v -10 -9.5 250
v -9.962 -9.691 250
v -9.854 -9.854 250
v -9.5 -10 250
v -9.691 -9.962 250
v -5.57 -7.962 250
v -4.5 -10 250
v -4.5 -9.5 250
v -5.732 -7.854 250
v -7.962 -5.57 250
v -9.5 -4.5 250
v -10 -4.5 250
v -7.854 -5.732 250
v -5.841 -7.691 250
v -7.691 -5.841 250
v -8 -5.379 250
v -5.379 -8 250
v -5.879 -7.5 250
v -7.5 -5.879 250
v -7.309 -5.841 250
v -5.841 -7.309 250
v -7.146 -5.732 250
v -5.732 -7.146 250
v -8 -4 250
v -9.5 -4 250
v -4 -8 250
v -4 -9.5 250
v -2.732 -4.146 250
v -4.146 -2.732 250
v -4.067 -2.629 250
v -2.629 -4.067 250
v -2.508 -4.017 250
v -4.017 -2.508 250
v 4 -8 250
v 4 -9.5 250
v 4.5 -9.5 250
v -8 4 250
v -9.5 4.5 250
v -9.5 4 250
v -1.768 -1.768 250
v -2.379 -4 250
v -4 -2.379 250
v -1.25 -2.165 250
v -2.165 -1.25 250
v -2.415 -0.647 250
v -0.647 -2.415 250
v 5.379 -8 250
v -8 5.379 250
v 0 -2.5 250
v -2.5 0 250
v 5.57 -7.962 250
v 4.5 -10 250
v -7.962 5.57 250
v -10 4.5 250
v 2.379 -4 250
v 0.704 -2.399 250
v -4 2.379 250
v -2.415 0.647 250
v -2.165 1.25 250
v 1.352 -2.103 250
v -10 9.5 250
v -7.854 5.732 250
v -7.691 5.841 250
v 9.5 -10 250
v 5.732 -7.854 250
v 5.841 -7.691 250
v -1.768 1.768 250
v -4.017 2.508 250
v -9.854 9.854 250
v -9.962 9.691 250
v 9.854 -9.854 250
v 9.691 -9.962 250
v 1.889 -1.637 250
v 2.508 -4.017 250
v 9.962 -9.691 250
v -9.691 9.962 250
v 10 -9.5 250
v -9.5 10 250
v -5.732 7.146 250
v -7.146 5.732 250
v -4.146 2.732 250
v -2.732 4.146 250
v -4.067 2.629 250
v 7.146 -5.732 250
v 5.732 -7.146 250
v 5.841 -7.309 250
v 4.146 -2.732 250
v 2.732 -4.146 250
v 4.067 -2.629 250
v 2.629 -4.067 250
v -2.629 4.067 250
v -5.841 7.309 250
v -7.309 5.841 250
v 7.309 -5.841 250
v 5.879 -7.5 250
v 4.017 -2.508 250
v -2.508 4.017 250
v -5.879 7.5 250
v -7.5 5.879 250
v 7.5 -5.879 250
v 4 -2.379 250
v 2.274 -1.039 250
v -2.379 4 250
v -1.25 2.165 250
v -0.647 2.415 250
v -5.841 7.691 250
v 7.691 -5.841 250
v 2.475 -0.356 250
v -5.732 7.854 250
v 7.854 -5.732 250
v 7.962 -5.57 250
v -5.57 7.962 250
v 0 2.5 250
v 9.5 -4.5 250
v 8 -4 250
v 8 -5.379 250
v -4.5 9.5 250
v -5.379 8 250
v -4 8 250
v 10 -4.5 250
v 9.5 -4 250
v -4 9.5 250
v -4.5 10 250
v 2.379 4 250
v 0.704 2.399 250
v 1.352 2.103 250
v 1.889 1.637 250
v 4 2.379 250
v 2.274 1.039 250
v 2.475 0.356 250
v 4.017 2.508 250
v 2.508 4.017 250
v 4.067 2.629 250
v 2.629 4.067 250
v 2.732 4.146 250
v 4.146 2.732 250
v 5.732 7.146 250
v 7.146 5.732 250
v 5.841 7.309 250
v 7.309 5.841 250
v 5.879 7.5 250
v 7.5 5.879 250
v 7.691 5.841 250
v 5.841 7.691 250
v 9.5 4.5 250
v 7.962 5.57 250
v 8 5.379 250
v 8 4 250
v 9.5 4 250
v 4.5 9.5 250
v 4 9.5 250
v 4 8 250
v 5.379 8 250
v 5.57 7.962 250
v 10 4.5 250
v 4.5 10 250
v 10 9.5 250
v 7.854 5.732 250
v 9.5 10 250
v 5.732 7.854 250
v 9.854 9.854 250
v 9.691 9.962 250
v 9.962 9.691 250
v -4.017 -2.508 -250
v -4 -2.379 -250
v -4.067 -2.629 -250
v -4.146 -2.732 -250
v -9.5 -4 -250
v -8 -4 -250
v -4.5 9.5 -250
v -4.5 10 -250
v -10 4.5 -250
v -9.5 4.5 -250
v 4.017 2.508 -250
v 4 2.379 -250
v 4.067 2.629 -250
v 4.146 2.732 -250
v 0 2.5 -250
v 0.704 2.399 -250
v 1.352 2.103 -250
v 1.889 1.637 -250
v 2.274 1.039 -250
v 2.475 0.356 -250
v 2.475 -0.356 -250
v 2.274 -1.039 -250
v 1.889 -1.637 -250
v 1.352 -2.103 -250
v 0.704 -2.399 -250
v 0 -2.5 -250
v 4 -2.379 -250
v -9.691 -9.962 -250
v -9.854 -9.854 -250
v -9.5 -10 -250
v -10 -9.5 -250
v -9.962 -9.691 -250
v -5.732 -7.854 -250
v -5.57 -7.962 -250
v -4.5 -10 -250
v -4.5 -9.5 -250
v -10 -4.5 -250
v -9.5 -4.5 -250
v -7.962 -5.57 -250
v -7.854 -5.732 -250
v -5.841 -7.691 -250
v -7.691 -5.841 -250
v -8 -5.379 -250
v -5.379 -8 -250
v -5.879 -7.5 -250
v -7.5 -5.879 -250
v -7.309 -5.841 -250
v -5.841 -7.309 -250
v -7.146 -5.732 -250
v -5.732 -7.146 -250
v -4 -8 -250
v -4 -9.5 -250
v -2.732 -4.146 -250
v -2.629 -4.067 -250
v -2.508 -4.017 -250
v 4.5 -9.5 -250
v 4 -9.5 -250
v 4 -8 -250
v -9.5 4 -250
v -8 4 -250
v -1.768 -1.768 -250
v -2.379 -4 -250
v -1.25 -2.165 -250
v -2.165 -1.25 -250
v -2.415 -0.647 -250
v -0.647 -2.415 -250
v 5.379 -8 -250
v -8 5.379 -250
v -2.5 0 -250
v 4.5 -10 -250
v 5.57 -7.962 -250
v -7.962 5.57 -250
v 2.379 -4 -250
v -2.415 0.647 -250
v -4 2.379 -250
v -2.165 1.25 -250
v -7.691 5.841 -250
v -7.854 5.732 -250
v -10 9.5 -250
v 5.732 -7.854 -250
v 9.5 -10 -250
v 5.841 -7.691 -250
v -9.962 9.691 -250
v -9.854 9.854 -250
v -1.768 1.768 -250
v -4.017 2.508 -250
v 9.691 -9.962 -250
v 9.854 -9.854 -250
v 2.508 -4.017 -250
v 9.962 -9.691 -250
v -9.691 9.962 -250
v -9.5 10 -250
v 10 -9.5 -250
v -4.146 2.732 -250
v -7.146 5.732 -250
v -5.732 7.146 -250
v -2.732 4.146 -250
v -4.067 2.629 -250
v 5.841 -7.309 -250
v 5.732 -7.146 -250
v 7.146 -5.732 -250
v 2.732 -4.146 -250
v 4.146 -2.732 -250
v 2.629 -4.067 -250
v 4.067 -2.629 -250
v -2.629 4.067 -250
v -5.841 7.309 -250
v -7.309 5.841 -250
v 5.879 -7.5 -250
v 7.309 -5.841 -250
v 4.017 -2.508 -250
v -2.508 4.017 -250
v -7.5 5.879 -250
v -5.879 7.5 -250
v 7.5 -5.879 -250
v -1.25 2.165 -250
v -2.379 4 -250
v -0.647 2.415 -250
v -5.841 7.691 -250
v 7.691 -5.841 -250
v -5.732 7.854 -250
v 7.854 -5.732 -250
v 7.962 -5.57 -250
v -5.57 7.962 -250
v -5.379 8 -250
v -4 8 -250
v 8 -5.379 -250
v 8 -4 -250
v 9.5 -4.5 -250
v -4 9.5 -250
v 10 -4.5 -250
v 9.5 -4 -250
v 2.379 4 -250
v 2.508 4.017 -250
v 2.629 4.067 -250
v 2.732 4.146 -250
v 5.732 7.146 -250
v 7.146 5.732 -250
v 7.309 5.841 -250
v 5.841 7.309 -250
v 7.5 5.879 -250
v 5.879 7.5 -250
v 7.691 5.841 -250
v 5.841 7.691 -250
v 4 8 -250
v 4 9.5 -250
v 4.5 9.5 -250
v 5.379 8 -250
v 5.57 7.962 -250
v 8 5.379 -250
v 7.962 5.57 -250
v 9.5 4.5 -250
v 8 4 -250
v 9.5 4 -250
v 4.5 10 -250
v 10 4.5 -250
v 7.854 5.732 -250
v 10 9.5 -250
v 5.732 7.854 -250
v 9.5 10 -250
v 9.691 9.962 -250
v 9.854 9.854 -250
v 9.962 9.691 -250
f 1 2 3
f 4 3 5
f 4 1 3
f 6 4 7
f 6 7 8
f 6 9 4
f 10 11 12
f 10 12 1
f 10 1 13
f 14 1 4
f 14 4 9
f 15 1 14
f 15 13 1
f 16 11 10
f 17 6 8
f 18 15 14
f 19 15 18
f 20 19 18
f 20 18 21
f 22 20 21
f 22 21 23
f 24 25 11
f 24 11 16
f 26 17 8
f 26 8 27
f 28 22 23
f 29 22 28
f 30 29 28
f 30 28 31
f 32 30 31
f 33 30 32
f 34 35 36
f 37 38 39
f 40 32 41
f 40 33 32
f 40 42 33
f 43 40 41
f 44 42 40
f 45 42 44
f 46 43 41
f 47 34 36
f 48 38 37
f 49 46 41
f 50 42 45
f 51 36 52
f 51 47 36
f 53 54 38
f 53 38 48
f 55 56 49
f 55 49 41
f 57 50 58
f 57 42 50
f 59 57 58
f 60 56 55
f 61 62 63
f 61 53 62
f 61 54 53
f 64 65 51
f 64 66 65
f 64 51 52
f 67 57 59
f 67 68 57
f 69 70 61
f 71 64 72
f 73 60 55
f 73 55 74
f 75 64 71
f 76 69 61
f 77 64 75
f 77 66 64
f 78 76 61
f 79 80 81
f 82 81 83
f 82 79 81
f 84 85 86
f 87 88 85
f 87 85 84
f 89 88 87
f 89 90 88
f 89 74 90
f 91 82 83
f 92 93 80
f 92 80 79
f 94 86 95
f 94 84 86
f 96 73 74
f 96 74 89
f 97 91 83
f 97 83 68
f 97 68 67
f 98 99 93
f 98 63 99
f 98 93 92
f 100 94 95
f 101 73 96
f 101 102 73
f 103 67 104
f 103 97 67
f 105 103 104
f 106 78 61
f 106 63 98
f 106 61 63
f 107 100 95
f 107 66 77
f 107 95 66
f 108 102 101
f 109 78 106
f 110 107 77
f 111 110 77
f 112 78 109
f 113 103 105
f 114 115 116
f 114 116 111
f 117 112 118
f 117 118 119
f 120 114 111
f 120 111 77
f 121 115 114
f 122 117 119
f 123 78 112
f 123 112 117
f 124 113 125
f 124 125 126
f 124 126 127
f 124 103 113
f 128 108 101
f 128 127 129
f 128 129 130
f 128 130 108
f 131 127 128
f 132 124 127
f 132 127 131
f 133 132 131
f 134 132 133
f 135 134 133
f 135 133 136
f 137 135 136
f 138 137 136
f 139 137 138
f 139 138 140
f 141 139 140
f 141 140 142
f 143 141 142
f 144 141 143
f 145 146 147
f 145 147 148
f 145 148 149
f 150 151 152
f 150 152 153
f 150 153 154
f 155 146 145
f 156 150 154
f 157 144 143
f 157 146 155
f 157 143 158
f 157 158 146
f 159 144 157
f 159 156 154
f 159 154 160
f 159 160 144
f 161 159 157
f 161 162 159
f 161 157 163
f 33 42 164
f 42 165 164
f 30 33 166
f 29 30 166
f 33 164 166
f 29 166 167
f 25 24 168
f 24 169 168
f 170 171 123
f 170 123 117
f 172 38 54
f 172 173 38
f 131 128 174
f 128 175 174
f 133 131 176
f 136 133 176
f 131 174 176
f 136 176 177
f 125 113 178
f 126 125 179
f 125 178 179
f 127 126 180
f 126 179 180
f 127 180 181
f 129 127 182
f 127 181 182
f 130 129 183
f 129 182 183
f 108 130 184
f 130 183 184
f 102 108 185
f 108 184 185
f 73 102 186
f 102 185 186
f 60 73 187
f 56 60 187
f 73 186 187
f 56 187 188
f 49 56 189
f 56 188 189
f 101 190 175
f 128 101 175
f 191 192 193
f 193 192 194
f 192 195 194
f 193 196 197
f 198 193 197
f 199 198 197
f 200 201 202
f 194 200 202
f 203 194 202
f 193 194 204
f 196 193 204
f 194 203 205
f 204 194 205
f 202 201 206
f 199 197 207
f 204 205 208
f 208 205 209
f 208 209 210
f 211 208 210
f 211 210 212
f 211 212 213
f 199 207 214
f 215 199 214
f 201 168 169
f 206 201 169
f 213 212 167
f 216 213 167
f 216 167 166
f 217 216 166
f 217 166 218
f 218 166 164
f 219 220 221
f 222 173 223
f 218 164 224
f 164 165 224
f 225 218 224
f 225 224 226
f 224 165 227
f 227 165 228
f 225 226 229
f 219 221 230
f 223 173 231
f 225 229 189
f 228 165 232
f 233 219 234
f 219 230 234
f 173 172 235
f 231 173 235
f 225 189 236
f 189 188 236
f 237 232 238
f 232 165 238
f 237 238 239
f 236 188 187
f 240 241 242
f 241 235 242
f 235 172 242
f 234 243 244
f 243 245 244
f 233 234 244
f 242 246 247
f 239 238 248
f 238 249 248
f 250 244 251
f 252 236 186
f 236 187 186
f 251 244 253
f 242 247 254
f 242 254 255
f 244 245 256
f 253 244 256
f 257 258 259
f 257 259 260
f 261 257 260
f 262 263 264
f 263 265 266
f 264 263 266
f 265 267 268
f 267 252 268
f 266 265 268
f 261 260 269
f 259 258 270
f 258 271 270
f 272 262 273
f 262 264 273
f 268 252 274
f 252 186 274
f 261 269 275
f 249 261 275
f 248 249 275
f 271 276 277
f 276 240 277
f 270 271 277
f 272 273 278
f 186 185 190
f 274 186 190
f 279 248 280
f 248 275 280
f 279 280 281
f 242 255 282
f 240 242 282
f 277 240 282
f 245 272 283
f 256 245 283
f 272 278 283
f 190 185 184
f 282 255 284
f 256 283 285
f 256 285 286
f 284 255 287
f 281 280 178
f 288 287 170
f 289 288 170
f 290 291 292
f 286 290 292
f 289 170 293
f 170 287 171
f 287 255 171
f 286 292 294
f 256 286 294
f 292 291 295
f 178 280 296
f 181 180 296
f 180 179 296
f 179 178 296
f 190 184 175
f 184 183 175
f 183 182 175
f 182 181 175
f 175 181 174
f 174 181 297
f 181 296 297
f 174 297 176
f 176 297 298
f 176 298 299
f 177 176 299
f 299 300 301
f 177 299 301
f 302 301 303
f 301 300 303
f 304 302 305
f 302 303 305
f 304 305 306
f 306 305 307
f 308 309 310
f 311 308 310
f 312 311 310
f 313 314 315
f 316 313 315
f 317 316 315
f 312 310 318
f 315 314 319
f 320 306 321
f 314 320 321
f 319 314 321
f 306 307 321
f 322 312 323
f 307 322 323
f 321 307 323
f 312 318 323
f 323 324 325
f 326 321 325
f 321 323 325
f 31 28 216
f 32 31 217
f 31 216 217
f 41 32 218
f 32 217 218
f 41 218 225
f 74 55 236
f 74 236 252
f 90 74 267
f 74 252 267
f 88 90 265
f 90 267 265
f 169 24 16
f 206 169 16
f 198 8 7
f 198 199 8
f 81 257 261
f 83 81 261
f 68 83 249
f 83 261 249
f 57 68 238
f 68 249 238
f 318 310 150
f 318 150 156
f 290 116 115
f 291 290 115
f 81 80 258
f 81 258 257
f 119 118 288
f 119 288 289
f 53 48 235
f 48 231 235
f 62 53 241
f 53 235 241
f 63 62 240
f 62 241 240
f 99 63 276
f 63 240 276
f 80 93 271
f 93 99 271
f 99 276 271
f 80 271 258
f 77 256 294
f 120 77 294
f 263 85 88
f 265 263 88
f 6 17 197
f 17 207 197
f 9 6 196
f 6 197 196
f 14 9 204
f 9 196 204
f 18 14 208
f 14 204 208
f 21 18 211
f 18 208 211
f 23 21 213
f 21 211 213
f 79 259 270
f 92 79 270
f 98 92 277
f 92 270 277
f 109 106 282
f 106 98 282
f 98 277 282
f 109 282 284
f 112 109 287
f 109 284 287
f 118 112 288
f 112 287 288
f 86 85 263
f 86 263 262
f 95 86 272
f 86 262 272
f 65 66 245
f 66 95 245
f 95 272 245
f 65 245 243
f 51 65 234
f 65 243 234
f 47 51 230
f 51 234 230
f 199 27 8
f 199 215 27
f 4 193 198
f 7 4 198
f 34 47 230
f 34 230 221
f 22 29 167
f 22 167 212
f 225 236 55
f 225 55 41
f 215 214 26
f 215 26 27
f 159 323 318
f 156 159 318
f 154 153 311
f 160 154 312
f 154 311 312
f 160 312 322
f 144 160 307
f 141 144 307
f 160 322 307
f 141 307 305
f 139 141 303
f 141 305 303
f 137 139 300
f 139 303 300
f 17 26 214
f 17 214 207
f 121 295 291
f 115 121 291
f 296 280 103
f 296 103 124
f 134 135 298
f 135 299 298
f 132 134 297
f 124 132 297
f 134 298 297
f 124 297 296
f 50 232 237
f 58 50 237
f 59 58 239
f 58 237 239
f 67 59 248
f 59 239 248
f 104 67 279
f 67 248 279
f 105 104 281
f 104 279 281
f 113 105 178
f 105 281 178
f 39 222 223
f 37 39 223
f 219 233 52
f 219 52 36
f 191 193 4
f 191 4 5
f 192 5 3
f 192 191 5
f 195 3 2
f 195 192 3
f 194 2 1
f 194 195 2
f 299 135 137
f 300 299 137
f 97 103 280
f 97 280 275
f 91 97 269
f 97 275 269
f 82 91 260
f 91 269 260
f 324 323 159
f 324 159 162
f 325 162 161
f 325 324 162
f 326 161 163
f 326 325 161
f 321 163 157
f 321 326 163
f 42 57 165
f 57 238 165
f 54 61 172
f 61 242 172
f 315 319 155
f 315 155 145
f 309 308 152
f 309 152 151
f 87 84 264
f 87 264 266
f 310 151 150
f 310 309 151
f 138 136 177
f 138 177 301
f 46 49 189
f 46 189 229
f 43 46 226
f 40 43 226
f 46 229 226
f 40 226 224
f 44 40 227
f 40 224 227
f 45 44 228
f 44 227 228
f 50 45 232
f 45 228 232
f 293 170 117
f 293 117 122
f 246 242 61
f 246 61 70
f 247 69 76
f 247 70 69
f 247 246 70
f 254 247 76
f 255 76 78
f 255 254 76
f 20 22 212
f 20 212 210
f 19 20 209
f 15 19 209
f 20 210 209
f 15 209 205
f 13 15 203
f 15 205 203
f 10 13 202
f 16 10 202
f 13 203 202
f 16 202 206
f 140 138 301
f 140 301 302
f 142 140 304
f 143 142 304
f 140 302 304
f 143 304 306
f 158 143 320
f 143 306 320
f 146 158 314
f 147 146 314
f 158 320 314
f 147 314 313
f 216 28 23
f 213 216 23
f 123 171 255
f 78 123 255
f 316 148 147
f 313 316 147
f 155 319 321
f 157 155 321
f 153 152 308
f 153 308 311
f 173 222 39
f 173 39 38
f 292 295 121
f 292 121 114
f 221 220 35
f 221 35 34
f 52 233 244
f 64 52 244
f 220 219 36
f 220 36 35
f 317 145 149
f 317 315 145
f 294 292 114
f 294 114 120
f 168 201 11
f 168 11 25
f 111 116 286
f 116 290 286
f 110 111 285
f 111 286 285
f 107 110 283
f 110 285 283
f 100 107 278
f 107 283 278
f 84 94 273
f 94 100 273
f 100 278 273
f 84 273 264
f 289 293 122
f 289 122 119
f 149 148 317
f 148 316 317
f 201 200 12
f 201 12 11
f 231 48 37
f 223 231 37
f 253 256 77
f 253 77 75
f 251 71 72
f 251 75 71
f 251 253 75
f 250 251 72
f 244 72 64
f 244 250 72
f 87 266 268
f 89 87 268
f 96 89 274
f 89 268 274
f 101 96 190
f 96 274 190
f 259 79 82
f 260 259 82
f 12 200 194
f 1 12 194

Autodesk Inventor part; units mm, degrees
sketch "Esboço1" plane through (0, 0, 0) normal (0, 0, 1) x (1, 0, 0)
  line L0 (-10, 10) -> (10, 10) construction
  circle A0 centre (0, 0) radius 2.5 construction
  line L1 (-4, 4) -> (4, 4) construction
  line L2 (0, 0) -> (-10, 10) construction
  line L3 (-6.5858, 8) -> (-4, 8) construction
  line L4 (-4, 8) -> (-4, 10) construction
  line L5 (-4, 10) -> (-10, 10) construction
  line L6 (-4, 4) -> (-4, -4) construction
  line L7 (-6.5858, 8) -> (-2.5858, 4) construction
  line L8 (-8, 6.5858) -> (-4, 2.5858) construction
  line L9 (-10, 10) -> (-10, 0) construction
  line L10 (-10, 10) -> (-10, 4) construction
  line L11 (-8, 6.5858) -> (-8, 4) construction
  line L12 (-8, 4) -> (-10, 4) construction
  line L13 (-10, 4) -> (-9.5, 4) construction
  line L14 (-9.5, 4) -> (-9.5, 4.5)
  line L15 (-9.5, 4.5) -> (-10, 4.5)
  line L16 (-10, 4.5) -> (-10, 4) construction
  line L17 (-10, 10) -> (-10, 4.5) construction
  line L18 (-9.5, 4) -> (-8, 4)
  line L19 (-4, 10) -> (-4.5, 10) construction
  line L20 (-4.5, 10) -> (-4.5, 9.5)
  line L21 (-4.5, 9.5) -> (-4, 9.5)
  line L22 (-4, 9.5) -> (-4, 10) construction
  line L23 (-4, 9.5) -> (-4, 8)
  line L24 (-4.5, 10) -> (-10, 10) construction
  arc A1 (-9.5, 10) -> (-10, 9.5) centre (-9.5, 9.5) ccw
  line L25 (-4.5, 10) -> (-9.5, 10)
  line L26 (-10, 9.5) -> (-10, 4.5)
  line L27 (-2.5858, 4) -> (0, 4) construction
  arc A2 (-5.3787, 8) -> (-5.7322, 7.1464) centre (-5.3787, 7.5) ccw
  line L28 (-5.3787, 8) -> (-4, 8)
  line L29 (-5.7322, 7.1464) -> (-2.5858, 4) construction
  arc A3 (-7.1464, 5.7322) -> (-8, 5.3787) centre (-7.5, 5.3787) ccw
  line L30 (-7.1464, 5.7322) -> (-4, 2.5858) construction
  line L31 (-8, 5.3787) -> (-8, 4)
  arc A4 (0, 2.5) -> (-2.5, 0) centre (0, 0) ccw
  line L32 (0, 4) -> (0, 2.5)
  line L33 (-4, 2.5858) -> (-4, 0) construction
  line L34 (-4, 0) -> (-2.5, 0)
  arc A5 (-2.7322, 4.1464) -> (-2.3787, 4) centre (-2.3787, 4.5) ccw
  line L35 (-5.7322, 7.1464) -> (-2.7322, 4.1464)
  line L36 (-2.3787, 4) -> (0, 4)
  arc A6 (-4, 2.3787) -> (-4.1464, 2.7322) centre (-4.5, 2.3787) ccw
  line L37 (-7.1464, 5.7322) -> (-4.1464, 2.7322)
  line L38 (-4, 2.3787) -> (-4, 0)
  point P0 (0, 10)
  point P1 (-3.25, 0)
  dimension "d0" = 20
  dimension "d2" = 5
  dimension "d3" = 6
  dimension "d5" = 2
  dimension "d7" = 1
  dimension "d8" = 6
  dimension "d9" = 1
  dimension "d10" = 0.5
  dimension "d11" = 0.5
  dimension "d12" = 0.5
  dimension "d14" = 0.5
  dimension "d15" = 0.5
  dimension "d16" = 10
  dimension "d17" = 2.5
  dimension "d20" = 0.5
  dimension "d21" = 0.5
extrude "Extrusão1" add sketch "Esboço1" along normal mid plane 500
mirror "Espelhar1" about plane through (0, 0, 0) normal (1, 0, 0) of "Extrusão1"
mirror "Espelhar2" about plane through (0, 0, 0) normal (0, 1, 0) of "Extrusão1", "Espelhar1"
equation "\"d16\" = 0.5 * d0"
properties part number "20×20 4 slots profile_AST02002004" material "UHMW, branco"
